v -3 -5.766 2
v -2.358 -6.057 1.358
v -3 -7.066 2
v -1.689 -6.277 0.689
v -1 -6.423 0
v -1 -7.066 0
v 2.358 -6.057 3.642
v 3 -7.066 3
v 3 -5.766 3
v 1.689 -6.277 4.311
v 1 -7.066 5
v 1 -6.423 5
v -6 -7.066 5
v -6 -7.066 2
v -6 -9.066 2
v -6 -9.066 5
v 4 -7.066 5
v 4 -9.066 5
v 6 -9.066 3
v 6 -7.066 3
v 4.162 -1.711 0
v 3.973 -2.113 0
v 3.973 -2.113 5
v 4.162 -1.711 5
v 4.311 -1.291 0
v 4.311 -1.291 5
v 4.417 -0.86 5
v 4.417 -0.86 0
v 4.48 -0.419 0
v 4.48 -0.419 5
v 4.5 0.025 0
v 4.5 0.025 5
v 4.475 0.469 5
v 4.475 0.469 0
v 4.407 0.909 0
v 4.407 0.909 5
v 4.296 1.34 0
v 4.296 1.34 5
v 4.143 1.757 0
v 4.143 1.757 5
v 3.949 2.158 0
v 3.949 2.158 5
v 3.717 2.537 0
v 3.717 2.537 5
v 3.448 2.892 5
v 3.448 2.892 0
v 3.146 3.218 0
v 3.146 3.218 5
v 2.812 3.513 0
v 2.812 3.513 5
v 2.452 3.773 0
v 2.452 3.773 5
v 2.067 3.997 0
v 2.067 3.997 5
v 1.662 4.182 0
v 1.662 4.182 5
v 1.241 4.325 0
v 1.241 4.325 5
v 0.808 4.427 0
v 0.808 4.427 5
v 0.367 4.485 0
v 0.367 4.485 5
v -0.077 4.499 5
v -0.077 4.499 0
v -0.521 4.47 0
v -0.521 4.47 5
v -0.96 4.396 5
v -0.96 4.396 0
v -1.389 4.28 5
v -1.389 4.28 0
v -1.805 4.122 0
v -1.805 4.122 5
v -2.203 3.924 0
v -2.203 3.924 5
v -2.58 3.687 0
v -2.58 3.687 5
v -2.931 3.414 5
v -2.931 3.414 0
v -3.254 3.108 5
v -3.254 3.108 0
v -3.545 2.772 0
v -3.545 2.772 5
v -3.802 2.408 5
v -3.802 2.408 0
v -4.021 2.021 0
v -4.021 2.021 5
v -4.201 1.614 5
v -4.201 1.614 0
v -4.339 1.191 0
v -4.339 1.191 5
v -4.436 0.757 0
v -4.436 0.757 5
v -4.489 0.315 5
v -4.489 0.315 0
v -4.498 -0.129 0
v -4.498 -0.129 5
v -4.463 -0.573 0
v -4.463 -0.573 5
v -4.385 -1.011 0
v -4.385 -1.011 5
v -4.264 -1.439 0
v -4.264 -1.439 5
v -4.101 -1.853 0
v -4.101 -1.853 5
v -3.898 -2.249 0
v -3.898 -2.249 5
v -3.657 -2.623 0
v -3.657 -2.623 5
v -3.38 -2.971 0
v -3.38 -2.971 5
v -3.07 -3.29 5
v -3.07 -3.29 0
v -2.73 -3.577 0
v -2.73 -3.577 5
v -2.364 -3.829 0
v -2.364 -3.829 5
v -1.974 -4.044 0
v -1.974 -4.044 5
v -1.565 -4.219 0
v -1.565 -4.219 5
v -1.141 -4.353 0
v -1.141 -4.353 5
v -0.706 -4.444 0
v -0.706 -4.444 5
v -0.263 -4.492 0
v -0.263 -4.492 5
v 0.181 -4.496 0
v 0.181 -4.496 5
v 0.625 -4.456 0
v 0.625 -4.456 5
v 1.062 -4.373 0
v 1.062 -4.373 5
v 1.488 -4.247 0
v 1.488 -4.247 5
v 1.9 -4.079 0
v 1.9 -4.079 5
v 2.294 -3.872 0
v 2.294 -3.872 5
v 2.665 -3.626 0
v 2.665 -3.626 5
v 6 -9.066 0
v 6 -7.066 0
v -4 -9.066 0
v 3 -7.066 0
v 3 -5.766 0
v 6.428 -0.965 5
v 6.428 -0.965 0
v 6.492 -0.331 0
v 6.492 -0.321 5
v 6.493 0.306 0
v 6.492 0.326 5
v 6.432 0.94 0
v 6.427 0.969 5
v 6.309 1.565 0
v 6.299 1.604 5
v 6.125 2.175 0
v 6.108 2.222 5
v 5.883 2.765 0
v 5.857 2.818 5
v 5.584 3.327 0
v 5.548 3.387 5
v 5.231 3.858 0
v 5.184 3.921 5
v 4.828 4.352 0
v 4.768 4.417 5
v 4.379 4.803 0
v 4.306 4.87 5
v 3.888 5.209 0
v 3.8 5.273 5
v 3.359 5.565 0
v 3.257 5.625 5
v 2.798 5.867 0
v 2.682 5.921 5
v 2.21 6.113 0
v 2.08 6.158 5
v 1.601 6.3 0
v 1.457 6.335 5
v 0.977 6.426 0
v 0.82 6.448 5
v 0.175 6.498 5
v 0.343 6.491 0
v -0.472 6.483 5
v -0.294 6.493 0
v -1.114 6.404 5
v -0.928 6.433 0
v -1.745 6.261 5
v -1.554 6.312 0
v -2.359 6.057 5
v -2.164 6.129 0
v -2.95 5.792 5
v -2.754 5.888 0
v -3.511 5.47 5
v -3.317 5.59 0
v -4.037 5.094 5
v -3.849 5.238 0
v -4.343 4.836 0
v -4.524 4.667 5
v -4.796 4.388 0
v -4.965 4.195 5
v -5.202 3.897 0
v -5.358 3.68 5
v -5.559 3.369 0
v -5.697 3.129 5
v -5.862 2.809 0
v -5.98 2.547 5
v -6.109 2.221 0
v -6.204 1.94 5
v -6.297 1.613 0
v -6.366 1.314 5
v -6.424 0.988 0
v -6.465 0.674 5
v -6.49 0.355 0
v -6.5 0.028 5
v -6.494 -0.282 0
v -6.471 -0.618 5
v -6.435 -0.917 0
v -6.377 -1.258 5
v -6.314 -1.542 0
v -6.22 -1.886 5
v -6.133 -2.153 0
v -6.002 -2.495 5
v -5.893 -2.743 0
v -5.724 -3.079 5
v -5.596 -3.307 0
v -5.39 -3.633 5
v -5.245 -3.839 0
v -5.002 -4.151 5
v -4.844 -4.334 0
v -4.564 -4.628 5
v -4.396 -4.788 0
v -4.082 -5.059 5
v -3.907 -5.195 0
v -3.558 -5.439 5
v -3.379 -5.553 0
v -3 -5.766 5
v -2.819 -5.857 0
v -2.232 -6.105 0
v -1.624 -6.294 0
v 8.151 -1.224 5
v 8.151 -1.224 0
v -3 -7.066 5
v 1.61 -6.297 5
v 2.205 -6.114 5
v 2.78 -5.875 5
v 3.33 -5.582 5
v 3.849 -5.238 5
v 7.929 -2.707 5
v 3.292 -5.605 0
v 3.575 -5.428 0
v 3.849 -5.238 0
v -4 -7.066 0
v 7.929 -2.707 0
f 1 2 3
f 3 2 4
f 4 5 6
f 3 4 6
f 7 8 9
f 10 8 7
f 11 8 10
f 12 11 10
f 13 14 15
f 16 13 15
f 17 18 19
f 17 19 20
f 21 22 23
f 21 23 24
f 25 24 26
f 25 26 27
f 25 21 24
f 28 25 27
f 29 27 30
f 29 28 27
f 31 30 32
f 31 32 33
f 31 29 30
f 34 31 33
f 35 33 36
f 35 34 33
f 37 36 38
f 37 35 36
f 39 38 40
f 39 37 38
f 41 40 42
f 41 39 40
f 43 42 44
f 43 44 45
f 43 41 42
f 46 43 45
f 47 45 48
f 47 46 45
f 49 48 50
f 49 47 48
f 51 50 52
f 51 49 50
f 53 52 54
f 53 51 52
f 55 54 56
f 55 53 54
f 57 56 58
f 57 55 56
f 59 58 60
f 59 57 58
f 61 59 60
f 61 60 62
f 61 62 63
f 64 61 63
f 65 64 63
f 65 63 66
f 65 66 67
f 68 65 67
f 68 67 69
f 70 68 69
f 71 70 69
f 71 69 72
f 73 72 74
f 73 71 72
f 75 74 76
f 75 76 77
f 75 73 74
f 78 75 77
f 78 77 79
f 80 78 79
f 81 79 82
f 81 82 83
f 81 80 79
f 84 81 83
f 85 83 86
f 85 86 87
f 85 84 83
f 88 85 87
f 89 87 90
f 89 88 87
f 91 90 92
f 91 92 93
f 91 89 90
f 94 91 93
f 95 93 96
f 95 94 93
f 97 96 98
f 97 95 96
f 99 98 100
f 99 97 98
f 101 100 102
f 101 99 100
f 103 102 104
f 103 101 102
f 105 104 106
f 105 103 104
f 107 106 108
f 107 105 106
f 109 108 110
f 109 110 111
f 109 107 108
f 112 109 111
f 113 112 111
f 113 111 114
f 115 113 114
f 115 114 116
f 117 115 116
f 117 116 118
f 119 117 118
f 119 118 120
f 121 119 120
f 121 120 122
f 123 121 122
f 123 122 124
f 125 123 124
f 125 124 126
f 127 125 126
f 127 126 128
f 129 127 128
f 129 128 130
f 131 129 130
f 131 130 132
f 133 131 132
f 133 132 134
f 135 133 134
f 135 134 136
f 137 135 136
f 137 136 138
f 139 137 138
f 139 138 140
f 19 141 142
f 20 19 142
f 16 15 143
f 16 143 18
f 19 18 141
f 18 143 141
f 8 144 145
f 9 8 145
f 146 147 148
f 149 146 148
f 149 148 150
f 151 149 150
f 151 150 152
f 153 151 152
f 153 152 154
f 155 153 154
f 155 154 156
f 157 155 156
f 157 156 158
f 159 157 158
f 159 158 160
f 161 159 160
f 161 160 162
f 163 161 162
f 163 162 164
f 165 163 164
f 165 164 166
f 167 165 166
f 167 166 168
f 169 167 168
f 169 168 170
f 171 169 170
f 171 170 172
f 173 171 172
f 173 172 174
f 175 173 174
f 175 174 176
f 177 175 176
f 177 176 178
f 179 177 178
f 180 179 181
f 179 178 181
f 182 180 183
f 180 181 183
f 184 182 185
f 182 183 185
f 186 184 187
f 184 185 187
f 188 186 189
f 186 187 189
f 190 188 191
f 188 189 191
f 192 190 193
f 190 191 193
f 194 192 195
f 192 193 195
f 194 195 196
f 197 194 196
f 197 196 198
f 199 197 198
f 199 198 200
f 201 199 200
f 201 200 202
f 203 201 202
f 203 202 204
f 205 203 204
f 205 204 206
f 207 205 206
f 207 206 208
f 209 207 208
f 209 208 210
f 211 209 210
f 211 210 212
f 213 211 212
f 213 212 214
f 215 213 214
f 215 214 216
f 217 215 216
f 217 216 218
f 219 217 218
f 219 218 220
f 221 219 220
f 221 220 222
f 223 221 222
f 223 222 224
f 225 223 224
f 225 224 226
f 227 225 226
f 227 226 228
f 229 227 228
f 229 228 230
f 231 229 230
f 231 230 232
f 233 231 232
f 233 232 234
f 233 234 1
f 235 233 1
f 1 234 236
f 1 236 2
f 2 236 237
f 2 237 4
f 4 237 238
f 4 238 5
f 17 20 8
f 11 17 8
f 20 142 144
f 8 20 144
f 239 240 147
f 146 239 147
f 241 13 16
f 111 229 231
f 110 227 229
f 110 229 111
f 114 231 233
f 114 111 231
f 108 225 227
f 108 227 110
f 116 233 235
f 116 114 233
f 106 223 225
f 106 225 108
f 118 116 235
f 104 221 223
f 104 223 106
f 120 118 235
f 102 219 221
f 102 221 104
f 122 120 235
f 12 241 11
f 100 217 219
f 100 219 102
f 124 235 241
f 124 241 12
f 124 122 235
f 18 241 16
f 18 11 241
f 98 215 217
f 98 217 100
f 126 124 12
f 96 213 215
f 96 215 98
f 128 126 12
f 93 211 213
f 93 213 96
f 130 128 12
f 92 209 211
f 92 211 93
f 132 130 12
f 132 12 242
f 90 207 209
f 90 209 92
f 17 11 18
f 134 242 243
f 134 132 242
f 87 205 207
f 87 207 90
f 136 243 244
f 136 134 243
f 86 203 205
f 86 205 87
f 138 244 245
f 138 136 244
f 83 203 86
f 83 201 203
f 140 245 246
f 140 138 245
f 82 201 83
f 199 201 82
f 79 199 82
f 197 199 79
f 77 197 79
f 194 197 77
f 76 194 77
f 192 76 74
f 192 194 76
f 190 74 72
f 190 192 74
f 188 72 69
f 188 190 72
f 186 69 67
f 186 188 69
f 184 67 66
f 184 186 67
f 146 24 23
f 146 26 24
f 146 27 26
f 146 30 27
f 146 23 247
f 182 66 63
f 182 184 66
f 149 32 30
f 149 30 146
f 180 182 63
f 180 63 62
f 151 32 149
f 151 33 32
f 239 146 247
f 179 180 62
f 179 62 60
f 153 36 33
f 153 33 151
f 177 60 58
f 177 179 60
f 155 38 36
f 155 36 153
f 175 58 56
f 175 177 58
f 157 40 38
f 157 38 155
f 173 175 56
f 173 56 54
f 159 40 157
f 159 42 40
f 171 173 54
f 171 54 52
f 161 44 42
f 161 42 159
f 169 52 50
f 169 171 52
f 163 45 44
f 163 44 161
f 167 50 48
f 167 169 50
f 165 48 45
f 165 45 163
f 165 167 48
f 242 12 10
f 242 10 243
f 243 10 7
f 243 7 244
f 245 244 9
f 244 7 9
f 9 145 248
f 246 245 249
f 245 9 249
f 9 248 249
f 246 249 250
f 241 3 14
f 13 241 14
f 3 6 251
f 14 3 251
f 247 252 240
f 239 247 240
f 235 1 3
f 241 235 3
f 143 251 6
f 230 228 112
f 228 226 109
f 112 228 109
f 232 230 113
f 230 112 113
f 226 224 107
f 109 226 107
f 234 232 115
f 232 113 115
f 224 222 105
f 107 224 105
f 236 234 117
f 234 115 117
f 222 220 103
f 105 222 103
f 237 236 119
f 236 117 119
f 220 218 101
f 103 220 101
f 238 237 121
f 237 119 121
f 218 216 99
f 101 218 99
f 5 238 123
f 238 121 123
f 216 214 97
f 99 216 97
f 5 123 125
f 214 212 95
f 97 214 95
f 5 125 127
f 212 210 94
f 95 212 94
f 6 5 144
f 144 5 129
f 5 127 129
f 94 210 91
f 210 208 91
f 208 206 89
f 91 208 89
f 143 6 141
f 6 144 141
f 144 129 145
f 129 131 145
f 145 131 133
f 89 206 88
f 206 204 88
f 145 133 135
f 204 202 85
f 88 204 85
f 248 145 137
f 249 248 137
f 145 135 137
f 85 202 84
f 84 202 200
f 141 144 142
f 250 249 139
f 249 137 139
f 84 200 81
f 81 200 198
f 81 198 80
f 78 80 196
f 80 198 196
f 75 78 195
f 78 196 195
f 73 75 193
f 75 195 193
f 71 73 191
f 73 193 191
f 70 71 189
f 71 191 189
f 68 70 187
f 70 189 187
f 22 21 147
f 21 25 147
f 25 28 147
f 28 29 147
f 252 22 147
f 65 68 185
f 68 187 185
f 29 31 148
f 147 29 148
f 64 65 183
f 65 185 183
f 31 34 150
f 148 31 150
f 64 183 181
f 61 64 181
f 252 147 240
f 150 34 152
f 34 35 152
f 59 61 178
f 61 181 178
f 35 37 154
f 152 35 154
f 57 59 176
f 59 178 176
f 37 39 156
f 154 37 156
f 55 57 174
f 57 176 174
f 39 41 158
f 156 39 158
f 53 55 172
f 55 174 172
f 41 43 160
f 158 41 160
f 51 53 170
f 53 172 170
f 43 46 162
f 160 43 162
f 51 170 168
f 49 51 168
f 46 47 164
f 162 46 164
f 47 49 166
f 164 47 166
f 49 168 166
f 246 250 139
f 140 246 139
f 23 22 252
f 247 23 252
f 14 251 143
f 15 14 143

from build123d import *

# Parameters (mm, degrees)
PAD_DEPTH    = 5
CHAMFER_SIZE = 2


with BuildPart() as part:
    # Sketch → Pad (new body)
    with BuildSketch(Plane.XY):
        with BuildLine():
            ThreePointArc((6.427935, -0.965218), (-2.949616, 5.792216), (-3, -5.766281))
            Line((-3, -5.766281), (-3, -7.066281))
            Line((-3, -7.066281), (-6, -7.066281))
            Line((-6, -7.066281), (-6, -9.066281))
            Line((-6, -9.066281), (6, -9.066281))
            Line((6, -9.066281), (6, -7.066281))
            Line((6, -7.066281), (3, -7.066281))
            Line((3, -7.066281), (3, -5.766281))
            ThreePointArc((3, -5.766281), (3.434671, -5.518427), (3.848989, -5.23787))
            Line((3.848989, -5.23787), (2.664685, -3.626218))
            ThreePointArc((3.972861, -2.113381), (-3.403883, 2.943396), (2.664685, -3.626218))
            Line((3.972861, -2.113381), (7.928513, -2.707361))
            Line((7.928513, -2.707361), (8.151256, -1.223992))
            Line((8.151256, -1.223992), (6.427935, -0.965218))
        make_face()
    extrude(amount=PAD_DEPTH)

    # Chamfer
    chamfer_edges = [part.edges().sort_by_distance(p)[0] for p in [
        (6, -8.066281, 5),
        (3, -6.416281, 5),
        (-3, -6.416281, 0),
        (-6, -8.066281, 0),
    ]]
    chamfer(chamfer_edges, length=CHAMFER_SIZE)


solid = part.part
